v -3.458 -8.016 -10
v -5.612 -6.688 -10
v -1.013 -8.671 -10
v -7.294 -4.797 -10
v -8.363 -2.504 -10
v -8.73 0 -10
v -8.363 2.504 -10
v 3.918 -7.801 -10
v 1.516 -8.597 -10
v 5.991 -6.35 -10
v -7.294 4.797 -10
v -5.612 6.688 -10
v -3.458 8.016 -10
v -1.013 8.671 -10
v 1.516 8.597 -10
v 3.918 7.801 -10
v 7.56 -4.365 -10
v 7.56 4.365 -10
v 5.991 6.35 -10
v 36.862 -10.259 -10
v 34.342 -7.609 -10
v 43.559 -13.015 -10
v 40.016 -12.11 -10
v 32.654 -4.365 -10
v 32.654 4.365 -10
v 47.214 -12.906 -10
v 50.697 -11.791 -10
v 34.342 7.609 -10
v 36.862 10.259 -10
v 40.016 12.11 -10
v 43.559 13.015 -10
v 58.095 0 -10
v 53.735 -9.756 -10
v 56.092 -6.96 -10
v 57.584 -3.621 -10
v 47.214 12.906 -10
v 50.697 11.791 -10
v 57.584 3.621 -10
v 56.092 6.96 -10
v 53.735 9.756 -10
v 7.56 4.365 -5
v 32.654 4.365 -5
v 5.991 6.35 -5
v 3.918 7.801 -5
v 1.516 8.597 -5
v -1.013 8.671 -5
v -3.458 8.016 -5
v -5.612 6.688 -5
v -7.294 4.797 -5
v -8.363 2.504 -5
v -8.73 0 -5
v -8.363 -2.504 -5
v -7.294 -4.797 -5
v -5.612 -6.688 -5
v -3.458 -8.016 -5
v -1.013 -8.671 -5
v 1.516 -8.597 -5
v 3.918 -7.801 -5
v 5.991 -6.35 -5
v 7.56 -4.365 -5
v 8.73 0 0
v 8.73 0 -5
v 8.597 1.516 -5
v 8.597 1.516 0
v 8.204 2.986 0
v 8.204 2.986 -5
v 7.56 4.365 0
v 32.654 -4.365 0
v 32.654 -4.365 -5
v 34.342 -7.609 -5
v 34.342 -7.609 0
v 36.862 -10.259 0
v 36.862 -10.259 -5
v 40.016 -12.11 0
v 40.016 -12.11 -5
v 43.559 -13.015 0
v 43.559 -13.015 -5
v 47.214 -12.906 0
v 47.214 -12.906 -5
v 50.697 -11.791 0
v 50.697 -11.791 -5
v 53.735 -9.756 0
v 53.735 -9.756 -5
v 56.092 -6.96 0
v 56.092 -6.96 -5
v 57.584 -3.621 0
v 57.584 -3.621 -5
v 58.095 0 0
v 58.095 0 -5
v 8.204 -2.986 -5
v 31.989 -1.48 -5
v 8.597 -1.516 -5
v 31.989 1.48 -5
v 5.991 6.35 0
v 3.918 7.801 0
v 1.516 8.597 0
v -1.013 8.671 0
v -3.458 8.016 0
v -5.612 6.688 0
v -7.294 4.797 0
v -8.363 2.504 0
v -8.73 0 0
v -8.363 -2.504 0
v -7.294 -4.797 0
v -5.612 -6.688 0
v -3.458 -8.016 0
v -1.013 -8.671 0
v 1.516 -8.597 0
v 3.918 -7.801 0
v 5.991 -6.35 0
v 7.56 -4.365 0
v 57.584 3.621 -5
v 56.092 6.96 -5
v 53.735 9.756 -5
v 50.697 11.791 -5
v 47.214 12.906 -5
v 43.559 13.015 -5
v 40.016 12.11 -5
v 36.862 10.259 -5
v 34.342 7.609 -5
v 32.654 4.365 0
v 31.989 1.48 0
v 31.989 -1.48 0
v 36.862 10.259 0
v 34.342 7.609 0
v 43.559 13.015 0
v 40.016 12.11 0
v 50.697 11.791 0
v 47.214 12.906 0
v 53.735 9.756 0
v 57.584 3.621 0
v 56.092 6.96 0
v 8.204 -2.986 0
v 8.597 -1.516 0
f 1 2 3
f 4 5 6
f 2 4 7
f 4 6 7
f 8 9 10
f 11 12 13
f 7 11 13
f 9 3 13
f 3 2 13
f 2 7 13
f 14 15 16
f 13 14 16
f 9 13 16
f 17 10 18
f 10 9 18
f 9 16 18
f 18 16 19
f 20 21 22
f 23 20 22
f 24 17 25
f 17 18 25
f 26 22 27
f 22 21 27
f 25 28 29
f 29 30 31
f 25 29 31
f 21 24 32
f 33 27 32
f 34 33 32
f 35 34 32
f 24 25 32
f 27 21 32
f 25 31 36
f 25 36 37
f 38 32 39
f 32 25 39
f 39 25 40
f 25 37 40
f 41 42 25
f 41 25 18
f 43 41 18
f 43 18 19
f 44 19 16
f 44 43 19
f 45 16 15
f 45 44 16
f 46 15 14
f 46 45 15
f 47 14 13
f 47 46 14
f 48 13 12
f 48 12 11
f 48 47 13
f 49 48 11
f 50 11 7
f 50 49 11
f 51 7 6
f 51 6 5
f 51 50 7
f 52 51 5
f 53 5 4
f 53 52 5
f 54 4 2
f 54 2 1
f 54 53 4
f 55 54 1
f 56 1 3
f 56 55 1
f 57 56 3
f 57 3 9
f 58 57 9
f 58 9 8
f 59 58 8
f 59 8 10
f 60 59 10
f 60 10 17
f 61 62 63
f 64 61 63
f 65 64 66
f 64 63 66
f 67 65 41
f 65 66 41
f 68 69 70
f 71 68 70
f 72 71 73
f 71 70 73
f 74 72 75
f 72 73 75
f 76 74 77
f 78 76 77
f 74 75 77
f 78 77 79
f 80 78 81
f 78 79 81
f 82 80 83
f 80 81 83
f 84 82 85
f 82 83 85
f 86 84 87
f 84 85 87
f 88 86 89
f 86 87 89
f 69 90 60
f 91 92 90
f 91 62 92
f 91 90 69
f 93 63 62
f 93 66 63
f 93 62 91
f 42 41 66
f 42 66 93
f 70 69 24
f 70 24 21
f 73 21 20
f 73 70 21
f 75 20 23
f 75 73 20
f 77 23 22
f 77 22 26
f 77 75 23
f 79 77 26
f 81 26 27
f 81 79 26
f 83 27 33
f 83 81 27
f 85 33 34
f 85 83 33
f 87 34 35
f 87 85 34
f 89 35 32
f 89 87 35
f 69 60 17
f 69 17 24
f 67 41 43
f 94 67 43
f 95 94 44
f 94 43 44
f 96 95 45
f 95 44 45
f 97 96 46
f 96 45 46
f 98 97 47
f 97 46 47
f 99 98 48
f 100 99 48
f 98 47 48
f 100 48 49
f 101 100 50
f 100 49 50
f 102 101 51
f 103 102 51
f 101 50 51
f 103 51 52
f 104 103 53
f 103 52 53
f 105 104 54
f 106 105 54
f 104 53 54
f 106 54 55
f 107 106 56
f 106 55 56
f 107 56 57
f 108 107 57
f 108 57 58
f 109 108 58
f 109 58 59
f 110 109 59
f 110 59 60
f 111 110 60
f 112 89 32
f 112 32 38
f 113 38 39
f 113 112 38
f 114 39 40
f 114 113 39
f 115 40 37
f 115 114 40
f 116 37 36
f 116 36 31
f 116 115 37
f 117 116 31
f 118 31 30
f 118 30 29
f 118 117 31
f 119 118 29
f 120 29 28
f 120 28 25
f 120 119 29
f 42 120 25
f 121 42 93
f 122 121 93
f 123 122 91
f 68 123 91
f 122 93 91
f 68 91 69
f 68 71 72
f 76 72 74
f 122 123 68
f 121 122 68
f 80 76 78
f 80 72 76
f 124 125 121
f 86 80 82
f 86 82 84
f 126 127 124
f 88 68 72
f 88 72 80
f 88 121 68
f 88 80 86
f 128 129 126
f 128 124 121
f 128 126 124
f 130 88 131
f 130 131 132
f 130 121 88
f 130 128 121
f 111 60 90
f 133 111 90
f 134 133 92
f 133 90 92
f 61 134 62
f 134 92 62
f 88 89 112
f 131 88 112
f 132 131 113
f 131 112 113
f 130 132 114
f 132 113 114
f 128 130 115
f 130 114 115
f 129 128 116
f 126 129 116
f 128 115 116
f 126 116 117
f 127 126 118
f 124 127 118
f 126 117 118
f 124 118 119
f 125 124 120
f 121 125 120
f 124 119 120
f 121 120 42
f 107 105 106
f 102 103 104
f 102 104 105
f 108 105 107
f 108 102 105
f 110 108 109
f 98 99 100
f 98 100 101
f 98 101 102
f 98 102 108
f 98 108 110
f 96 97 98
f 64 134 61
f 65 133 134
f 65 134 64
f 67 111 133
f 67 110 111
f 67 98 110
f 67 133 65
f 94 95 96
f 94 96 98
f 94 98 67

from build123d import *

# Parameters (mm, degrees)
F2_DEPTH = 5
F3_DEPTH = 5


with BuildPart() as f2:
    # F1 (on Top) → F2 (new body)
    with BuildSketch(Plane.XY):
        with BuildLine():
            ThreePointArc((7.560401775, -4.365), (8.4325324635, -2.2594902637), (8.73, 0))
            ThreePointArc((8.73, 0), (8.4325324635, 2.2594902637), (7.560401775, 4.365))
            ThreePointArc((7.560401775, 4.365), (-8.73, 0), (7.560401775, -4.365))
        make_face()
        with BuildLine():
            ThreePointArc((58.095, 0), (47.2143904114, 12.9064131387), (32.6539156005, 4.365))
            ThreePointArc((32.6539156005, 4.365), (31.905, 0), (32.6539156005, -4.365))
            ThreePointArc((32.6539156005, -4.365), (47.2143904114, -12.9064131387), (58.095, 0))
        make_face()
    extrude(amount=F2_DEPTH)

    # F1 (on Top) → F3 (join)
    with BuildSketch(Plane.XY):
        with BuildLine():
            ThreePointArc((58.095, 0), (47.2143904114, 12.9064131387), (32.6539156005, 4.365))
            ThreePointArc((32.6539156005, 4.365), (31.905, 0), (32.6539156005, -4.365))
            ThreePointArc((32.6539156005, -4.365), (47.2143904114, -12.9064131387), (58.095, 0))
        make_face()
        with BuildLine():
            ThreePointArc((7.560401775, 4.365), (8.4325324635, 2.2594902637), (8.73, 0))
            ThreePointArc((8.73, 0), (8.4325324635, -2.2594902637), (7.560401775, -4.365))
            Line((7.560401775, -4.365), (32.6539156005, -4.365))
            ThreePointArc((32.6539156005, -4.365), (31.905, 0), (32.6539156005, 4.365))
            Line((32.6539156005, 4.365), (7.560401775, 4.365))
        make_face()
        with BuildLine():
            ThreePointArc((7.560401775, -4.365), (8.4325324635, -2.2594902637), (8.73, 0))
            ThreePointArc((8.73, 0), (8.4325324635, 2.2594902637), (7.560401775, 4.365))
            ThreePointArc((7.560401775, 4.365), (-8.73, 0), (7.560401775, -4.365))
        make_face()
    extrude(amount=-F3_DEPTH)


with BuildPart() as f2_1:
    # F4: moved
    add(f2.part.moved(Location((0, 0, -5))))


solid = f2_1.part
